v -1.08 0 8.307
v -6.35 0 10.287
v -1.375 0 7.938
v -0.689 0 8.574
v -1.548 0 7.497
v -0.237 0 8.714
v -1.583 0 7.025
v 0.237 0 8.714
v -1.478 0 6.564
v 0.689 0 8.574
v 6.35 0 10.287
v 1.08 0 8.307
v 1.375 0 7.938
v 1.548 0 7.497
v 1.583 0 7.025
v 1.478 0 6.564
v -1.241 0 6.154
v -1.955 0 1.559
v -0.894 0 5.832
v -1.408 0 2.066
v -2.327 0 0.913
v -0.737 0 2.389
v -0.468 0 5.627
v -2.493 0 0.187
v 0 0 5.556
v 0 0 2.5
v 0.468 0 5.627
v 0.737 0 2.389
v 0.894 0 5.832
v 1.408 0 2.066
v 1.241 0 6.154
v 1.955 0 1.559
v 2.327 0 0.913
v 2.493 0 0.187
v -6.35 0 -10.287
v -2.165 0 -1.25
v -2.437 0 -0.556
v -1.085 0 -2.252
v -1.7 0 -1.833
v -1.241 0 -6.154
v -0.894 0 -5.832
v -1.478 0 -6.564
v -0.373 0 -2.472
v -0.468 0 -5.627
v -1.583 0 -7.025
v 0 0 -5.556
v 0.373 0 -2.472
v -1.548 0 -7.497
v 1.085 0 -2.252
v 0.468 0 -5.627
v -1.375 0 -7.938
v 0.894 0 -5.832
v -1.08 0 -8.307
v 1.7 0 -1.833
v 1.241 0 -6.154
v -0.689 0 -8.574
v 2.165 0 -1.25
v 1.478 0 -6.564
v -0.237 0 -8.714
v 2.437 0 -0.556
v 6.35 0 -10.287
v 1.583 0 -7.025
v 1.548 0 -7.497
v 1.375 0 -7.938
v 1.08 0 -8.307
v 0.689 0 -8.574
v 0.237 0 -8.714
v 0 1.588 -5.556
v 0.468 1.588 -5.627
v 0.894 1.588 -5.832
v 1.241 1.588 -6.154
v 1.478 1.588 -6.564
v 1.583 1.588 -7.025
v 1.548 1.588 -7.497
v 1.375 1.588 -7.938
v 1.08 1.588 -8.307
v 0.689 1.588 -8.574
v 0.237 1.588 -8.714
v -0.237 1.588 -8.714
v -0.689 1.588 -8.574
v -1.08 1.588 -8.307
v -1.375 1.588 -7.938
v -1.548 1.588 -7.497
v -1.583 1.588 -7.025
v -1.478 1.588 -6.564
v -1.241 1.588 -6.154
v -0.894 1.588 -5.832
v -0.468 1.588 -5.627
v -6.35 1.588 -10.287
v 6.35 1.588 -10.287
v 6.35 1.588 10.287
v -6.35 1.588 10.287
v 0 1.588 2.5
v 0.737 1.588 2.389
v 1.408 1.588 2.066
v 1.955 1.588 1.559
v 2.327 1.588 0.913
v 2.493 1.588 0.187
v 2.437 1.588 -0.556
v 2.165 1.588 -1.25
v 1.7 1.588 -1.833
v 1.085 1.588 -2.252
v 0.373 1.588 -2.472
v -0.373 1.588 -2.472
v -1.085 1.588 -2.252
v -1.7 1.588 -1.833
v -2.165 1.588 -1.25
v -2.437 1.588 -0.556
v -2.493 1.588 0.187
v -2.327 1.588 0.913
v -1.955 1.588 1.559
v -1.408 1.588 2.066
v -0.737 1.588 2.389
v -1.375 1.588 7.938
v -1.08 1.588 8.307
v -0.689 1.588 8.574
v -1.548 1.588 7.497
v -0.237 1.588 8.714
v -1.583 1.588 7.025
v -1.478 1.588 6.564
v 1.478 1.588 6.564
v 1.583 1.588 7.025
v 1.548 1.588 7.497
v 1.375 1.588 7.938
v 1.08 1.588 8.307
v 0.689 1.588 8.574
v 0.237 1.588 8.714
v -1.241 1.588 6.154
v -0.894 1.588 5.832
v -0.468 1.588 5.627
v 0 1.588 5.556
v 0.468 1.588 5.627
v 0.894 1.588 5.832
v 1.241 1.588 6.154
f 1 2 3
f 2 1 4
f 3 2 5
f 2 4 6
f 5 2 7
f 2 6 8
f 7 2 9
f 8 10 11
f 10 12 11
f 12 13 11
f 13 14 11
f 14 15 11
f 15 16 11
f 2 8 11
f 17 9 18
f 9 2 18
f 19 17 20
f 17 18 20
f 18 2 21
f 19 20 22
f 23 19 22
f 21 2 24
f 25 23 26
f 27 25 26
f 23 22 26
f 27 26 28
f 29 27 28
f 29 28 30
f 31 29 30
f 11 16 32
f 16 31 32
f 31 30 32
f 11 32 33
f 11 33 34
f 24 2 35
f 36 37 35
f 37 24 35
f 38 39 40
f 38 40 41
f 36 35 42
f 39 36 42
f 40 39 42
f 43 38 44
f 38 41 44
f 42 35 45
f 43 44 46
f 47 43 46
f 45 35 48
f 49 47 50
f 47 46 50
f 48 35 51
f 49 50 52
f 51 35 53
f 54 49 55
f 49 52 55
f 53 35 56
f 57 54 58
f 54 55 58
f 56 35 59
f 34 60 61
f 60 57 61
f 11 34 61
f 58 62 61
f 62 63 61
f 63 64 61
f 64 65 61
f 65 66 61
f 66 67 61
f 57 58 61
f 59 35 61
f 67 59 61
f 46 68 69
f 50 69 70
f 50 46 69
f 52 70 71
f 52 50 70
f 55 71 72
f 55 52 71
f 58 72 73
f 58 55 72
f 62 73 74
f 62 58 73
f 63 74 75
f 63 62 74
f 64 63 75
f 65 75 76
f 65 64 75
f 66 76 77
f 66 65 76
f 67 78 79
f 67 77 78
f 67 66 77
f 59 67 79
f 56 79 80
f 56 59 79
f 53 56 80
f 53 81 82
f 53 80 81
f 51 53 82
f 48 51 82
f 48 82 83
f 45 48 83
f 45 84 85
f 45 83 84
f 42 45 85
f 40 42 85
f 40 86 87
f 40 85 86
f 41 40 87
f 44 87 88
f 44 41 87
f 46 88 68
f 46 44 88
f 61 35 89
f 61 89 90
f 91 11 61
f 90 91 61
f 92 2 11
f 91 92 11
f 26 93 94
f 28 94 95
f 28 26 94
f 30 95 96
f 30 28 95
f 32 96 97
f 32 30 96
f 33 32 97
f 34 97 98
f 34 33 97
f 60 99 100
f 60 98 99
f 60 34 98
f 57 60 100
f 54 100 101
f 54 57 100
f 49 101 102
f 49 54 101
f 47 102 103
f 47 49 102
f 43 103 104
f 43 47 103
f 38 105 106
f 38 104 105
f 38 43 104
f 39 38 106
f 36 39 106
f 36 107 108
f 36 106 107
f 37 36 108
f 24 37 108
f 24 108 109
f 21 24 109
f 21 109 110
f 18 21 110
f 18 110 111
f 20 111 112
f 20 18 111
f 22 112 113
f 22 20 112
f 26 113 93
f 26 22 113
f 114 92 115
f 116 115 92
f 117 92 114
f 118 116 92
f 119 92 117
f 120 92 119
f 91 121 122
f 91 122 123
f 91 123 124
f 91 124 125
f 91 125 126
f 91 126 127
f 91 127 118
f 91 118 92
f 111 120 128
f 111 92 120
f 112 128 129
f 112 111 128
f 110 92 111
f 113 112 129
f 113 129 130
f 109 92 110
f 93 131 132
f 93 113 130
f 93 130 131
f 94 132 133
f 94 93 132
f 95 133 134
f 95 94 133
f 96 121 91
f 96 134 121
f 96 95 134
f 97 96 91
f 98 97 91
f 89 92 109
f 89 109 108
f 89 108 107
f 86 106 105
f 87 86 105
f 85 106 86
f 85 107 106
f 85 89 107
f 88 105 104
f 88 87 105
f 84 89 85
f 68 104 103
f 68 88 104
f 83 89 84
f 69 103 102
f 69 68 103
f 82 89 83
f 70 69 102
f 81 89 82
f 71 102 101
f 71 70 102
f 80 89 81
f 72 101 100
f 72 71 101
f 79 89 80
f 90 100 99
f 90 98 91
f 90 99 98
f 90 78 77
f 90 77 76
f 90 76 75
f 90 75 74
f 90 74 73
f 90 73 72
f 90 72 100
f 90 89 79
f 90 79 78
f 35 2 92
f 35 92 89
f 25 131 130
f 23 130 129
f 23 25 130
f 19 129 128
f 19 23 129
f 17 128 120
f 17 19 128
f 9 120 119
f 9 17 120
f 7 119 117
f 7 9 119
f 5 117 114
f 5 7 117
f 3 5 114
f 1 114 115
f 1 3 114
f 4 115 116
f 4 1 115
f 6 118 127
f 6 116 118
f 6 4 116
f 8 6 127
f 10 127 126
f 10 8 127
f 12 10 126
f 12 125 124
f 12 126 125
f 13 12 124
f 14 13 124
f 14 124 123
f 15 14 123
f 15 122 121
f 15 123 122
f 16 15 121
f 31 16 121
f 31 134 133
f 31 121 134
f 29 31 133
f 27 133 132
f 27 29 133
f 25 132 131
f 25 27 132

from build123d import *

# Parameters (mm, degrees)
SKETCH1_W          = 12.7
SKETCH1_H          = 20.574
EXTRUDE1_DEPTH     = 1.5875
SKETCH3_R          = 1.5875
CUT_EXTRUDE6_DEPTH = 13.192826795
CIRPATTERN1_COUNT  = 2
SKETCH5_R          = 2.5
CUT_EXTRUDE8_DEPTH = 13.192826795


with BuildPart() as part:
    # Sketch1 → Extrude1 (new body)
    with BuildSketch(Plane(origin=(0, 0, 0), x_dir=(1, 0, 0), z_dir=(0, 1, 0))):
        Rectangle(SKETCH1_W, SKETCH1_H)
    extrude(amount=EXTRUDE1_DEPTH)

    # Sketch3 → Cut-Extrude6 (cut, through all)
    with BuildSketch(Plane(origin=(0, 0, 0), x_dir=(1, 0, 0), z_dir=(0, 1, 0))):
        with Locations((0, 7.14375)):
            Circle(SKETCH3_R)
    cut_extrude6 = extrude(amount=CUT_EXTRUDE6_DEPTH, mode=Mode.SUBTRACT)

    # CirPattern1: Cut-Extrude6 ×2 about axis
    cirpattern1_axis = Axis((0, 8.776642466, 0), (0, -1, 0))
    for i in range(1, CIRPATTERN1_COUNT):
        add(cut_extrude6.rotate(cirpattern1_axis, i * 360 / CIRPATTERN1_COUNT), mode=Mode.SUBTRACT)

    # Sketch5 → Cut-Extrude8 (cut, through all)
    with BuildSketch(Plane(origin=(0, 0, 0), x_dir=(1, 0, 0), z_dir=(0, 1, 0))):
        Circle(SKETCH5_R)
    extrude(amount=CUT_EXTRUDE8_DEPTH, mode=Mode.SUBTRACT)


solid = part.part
